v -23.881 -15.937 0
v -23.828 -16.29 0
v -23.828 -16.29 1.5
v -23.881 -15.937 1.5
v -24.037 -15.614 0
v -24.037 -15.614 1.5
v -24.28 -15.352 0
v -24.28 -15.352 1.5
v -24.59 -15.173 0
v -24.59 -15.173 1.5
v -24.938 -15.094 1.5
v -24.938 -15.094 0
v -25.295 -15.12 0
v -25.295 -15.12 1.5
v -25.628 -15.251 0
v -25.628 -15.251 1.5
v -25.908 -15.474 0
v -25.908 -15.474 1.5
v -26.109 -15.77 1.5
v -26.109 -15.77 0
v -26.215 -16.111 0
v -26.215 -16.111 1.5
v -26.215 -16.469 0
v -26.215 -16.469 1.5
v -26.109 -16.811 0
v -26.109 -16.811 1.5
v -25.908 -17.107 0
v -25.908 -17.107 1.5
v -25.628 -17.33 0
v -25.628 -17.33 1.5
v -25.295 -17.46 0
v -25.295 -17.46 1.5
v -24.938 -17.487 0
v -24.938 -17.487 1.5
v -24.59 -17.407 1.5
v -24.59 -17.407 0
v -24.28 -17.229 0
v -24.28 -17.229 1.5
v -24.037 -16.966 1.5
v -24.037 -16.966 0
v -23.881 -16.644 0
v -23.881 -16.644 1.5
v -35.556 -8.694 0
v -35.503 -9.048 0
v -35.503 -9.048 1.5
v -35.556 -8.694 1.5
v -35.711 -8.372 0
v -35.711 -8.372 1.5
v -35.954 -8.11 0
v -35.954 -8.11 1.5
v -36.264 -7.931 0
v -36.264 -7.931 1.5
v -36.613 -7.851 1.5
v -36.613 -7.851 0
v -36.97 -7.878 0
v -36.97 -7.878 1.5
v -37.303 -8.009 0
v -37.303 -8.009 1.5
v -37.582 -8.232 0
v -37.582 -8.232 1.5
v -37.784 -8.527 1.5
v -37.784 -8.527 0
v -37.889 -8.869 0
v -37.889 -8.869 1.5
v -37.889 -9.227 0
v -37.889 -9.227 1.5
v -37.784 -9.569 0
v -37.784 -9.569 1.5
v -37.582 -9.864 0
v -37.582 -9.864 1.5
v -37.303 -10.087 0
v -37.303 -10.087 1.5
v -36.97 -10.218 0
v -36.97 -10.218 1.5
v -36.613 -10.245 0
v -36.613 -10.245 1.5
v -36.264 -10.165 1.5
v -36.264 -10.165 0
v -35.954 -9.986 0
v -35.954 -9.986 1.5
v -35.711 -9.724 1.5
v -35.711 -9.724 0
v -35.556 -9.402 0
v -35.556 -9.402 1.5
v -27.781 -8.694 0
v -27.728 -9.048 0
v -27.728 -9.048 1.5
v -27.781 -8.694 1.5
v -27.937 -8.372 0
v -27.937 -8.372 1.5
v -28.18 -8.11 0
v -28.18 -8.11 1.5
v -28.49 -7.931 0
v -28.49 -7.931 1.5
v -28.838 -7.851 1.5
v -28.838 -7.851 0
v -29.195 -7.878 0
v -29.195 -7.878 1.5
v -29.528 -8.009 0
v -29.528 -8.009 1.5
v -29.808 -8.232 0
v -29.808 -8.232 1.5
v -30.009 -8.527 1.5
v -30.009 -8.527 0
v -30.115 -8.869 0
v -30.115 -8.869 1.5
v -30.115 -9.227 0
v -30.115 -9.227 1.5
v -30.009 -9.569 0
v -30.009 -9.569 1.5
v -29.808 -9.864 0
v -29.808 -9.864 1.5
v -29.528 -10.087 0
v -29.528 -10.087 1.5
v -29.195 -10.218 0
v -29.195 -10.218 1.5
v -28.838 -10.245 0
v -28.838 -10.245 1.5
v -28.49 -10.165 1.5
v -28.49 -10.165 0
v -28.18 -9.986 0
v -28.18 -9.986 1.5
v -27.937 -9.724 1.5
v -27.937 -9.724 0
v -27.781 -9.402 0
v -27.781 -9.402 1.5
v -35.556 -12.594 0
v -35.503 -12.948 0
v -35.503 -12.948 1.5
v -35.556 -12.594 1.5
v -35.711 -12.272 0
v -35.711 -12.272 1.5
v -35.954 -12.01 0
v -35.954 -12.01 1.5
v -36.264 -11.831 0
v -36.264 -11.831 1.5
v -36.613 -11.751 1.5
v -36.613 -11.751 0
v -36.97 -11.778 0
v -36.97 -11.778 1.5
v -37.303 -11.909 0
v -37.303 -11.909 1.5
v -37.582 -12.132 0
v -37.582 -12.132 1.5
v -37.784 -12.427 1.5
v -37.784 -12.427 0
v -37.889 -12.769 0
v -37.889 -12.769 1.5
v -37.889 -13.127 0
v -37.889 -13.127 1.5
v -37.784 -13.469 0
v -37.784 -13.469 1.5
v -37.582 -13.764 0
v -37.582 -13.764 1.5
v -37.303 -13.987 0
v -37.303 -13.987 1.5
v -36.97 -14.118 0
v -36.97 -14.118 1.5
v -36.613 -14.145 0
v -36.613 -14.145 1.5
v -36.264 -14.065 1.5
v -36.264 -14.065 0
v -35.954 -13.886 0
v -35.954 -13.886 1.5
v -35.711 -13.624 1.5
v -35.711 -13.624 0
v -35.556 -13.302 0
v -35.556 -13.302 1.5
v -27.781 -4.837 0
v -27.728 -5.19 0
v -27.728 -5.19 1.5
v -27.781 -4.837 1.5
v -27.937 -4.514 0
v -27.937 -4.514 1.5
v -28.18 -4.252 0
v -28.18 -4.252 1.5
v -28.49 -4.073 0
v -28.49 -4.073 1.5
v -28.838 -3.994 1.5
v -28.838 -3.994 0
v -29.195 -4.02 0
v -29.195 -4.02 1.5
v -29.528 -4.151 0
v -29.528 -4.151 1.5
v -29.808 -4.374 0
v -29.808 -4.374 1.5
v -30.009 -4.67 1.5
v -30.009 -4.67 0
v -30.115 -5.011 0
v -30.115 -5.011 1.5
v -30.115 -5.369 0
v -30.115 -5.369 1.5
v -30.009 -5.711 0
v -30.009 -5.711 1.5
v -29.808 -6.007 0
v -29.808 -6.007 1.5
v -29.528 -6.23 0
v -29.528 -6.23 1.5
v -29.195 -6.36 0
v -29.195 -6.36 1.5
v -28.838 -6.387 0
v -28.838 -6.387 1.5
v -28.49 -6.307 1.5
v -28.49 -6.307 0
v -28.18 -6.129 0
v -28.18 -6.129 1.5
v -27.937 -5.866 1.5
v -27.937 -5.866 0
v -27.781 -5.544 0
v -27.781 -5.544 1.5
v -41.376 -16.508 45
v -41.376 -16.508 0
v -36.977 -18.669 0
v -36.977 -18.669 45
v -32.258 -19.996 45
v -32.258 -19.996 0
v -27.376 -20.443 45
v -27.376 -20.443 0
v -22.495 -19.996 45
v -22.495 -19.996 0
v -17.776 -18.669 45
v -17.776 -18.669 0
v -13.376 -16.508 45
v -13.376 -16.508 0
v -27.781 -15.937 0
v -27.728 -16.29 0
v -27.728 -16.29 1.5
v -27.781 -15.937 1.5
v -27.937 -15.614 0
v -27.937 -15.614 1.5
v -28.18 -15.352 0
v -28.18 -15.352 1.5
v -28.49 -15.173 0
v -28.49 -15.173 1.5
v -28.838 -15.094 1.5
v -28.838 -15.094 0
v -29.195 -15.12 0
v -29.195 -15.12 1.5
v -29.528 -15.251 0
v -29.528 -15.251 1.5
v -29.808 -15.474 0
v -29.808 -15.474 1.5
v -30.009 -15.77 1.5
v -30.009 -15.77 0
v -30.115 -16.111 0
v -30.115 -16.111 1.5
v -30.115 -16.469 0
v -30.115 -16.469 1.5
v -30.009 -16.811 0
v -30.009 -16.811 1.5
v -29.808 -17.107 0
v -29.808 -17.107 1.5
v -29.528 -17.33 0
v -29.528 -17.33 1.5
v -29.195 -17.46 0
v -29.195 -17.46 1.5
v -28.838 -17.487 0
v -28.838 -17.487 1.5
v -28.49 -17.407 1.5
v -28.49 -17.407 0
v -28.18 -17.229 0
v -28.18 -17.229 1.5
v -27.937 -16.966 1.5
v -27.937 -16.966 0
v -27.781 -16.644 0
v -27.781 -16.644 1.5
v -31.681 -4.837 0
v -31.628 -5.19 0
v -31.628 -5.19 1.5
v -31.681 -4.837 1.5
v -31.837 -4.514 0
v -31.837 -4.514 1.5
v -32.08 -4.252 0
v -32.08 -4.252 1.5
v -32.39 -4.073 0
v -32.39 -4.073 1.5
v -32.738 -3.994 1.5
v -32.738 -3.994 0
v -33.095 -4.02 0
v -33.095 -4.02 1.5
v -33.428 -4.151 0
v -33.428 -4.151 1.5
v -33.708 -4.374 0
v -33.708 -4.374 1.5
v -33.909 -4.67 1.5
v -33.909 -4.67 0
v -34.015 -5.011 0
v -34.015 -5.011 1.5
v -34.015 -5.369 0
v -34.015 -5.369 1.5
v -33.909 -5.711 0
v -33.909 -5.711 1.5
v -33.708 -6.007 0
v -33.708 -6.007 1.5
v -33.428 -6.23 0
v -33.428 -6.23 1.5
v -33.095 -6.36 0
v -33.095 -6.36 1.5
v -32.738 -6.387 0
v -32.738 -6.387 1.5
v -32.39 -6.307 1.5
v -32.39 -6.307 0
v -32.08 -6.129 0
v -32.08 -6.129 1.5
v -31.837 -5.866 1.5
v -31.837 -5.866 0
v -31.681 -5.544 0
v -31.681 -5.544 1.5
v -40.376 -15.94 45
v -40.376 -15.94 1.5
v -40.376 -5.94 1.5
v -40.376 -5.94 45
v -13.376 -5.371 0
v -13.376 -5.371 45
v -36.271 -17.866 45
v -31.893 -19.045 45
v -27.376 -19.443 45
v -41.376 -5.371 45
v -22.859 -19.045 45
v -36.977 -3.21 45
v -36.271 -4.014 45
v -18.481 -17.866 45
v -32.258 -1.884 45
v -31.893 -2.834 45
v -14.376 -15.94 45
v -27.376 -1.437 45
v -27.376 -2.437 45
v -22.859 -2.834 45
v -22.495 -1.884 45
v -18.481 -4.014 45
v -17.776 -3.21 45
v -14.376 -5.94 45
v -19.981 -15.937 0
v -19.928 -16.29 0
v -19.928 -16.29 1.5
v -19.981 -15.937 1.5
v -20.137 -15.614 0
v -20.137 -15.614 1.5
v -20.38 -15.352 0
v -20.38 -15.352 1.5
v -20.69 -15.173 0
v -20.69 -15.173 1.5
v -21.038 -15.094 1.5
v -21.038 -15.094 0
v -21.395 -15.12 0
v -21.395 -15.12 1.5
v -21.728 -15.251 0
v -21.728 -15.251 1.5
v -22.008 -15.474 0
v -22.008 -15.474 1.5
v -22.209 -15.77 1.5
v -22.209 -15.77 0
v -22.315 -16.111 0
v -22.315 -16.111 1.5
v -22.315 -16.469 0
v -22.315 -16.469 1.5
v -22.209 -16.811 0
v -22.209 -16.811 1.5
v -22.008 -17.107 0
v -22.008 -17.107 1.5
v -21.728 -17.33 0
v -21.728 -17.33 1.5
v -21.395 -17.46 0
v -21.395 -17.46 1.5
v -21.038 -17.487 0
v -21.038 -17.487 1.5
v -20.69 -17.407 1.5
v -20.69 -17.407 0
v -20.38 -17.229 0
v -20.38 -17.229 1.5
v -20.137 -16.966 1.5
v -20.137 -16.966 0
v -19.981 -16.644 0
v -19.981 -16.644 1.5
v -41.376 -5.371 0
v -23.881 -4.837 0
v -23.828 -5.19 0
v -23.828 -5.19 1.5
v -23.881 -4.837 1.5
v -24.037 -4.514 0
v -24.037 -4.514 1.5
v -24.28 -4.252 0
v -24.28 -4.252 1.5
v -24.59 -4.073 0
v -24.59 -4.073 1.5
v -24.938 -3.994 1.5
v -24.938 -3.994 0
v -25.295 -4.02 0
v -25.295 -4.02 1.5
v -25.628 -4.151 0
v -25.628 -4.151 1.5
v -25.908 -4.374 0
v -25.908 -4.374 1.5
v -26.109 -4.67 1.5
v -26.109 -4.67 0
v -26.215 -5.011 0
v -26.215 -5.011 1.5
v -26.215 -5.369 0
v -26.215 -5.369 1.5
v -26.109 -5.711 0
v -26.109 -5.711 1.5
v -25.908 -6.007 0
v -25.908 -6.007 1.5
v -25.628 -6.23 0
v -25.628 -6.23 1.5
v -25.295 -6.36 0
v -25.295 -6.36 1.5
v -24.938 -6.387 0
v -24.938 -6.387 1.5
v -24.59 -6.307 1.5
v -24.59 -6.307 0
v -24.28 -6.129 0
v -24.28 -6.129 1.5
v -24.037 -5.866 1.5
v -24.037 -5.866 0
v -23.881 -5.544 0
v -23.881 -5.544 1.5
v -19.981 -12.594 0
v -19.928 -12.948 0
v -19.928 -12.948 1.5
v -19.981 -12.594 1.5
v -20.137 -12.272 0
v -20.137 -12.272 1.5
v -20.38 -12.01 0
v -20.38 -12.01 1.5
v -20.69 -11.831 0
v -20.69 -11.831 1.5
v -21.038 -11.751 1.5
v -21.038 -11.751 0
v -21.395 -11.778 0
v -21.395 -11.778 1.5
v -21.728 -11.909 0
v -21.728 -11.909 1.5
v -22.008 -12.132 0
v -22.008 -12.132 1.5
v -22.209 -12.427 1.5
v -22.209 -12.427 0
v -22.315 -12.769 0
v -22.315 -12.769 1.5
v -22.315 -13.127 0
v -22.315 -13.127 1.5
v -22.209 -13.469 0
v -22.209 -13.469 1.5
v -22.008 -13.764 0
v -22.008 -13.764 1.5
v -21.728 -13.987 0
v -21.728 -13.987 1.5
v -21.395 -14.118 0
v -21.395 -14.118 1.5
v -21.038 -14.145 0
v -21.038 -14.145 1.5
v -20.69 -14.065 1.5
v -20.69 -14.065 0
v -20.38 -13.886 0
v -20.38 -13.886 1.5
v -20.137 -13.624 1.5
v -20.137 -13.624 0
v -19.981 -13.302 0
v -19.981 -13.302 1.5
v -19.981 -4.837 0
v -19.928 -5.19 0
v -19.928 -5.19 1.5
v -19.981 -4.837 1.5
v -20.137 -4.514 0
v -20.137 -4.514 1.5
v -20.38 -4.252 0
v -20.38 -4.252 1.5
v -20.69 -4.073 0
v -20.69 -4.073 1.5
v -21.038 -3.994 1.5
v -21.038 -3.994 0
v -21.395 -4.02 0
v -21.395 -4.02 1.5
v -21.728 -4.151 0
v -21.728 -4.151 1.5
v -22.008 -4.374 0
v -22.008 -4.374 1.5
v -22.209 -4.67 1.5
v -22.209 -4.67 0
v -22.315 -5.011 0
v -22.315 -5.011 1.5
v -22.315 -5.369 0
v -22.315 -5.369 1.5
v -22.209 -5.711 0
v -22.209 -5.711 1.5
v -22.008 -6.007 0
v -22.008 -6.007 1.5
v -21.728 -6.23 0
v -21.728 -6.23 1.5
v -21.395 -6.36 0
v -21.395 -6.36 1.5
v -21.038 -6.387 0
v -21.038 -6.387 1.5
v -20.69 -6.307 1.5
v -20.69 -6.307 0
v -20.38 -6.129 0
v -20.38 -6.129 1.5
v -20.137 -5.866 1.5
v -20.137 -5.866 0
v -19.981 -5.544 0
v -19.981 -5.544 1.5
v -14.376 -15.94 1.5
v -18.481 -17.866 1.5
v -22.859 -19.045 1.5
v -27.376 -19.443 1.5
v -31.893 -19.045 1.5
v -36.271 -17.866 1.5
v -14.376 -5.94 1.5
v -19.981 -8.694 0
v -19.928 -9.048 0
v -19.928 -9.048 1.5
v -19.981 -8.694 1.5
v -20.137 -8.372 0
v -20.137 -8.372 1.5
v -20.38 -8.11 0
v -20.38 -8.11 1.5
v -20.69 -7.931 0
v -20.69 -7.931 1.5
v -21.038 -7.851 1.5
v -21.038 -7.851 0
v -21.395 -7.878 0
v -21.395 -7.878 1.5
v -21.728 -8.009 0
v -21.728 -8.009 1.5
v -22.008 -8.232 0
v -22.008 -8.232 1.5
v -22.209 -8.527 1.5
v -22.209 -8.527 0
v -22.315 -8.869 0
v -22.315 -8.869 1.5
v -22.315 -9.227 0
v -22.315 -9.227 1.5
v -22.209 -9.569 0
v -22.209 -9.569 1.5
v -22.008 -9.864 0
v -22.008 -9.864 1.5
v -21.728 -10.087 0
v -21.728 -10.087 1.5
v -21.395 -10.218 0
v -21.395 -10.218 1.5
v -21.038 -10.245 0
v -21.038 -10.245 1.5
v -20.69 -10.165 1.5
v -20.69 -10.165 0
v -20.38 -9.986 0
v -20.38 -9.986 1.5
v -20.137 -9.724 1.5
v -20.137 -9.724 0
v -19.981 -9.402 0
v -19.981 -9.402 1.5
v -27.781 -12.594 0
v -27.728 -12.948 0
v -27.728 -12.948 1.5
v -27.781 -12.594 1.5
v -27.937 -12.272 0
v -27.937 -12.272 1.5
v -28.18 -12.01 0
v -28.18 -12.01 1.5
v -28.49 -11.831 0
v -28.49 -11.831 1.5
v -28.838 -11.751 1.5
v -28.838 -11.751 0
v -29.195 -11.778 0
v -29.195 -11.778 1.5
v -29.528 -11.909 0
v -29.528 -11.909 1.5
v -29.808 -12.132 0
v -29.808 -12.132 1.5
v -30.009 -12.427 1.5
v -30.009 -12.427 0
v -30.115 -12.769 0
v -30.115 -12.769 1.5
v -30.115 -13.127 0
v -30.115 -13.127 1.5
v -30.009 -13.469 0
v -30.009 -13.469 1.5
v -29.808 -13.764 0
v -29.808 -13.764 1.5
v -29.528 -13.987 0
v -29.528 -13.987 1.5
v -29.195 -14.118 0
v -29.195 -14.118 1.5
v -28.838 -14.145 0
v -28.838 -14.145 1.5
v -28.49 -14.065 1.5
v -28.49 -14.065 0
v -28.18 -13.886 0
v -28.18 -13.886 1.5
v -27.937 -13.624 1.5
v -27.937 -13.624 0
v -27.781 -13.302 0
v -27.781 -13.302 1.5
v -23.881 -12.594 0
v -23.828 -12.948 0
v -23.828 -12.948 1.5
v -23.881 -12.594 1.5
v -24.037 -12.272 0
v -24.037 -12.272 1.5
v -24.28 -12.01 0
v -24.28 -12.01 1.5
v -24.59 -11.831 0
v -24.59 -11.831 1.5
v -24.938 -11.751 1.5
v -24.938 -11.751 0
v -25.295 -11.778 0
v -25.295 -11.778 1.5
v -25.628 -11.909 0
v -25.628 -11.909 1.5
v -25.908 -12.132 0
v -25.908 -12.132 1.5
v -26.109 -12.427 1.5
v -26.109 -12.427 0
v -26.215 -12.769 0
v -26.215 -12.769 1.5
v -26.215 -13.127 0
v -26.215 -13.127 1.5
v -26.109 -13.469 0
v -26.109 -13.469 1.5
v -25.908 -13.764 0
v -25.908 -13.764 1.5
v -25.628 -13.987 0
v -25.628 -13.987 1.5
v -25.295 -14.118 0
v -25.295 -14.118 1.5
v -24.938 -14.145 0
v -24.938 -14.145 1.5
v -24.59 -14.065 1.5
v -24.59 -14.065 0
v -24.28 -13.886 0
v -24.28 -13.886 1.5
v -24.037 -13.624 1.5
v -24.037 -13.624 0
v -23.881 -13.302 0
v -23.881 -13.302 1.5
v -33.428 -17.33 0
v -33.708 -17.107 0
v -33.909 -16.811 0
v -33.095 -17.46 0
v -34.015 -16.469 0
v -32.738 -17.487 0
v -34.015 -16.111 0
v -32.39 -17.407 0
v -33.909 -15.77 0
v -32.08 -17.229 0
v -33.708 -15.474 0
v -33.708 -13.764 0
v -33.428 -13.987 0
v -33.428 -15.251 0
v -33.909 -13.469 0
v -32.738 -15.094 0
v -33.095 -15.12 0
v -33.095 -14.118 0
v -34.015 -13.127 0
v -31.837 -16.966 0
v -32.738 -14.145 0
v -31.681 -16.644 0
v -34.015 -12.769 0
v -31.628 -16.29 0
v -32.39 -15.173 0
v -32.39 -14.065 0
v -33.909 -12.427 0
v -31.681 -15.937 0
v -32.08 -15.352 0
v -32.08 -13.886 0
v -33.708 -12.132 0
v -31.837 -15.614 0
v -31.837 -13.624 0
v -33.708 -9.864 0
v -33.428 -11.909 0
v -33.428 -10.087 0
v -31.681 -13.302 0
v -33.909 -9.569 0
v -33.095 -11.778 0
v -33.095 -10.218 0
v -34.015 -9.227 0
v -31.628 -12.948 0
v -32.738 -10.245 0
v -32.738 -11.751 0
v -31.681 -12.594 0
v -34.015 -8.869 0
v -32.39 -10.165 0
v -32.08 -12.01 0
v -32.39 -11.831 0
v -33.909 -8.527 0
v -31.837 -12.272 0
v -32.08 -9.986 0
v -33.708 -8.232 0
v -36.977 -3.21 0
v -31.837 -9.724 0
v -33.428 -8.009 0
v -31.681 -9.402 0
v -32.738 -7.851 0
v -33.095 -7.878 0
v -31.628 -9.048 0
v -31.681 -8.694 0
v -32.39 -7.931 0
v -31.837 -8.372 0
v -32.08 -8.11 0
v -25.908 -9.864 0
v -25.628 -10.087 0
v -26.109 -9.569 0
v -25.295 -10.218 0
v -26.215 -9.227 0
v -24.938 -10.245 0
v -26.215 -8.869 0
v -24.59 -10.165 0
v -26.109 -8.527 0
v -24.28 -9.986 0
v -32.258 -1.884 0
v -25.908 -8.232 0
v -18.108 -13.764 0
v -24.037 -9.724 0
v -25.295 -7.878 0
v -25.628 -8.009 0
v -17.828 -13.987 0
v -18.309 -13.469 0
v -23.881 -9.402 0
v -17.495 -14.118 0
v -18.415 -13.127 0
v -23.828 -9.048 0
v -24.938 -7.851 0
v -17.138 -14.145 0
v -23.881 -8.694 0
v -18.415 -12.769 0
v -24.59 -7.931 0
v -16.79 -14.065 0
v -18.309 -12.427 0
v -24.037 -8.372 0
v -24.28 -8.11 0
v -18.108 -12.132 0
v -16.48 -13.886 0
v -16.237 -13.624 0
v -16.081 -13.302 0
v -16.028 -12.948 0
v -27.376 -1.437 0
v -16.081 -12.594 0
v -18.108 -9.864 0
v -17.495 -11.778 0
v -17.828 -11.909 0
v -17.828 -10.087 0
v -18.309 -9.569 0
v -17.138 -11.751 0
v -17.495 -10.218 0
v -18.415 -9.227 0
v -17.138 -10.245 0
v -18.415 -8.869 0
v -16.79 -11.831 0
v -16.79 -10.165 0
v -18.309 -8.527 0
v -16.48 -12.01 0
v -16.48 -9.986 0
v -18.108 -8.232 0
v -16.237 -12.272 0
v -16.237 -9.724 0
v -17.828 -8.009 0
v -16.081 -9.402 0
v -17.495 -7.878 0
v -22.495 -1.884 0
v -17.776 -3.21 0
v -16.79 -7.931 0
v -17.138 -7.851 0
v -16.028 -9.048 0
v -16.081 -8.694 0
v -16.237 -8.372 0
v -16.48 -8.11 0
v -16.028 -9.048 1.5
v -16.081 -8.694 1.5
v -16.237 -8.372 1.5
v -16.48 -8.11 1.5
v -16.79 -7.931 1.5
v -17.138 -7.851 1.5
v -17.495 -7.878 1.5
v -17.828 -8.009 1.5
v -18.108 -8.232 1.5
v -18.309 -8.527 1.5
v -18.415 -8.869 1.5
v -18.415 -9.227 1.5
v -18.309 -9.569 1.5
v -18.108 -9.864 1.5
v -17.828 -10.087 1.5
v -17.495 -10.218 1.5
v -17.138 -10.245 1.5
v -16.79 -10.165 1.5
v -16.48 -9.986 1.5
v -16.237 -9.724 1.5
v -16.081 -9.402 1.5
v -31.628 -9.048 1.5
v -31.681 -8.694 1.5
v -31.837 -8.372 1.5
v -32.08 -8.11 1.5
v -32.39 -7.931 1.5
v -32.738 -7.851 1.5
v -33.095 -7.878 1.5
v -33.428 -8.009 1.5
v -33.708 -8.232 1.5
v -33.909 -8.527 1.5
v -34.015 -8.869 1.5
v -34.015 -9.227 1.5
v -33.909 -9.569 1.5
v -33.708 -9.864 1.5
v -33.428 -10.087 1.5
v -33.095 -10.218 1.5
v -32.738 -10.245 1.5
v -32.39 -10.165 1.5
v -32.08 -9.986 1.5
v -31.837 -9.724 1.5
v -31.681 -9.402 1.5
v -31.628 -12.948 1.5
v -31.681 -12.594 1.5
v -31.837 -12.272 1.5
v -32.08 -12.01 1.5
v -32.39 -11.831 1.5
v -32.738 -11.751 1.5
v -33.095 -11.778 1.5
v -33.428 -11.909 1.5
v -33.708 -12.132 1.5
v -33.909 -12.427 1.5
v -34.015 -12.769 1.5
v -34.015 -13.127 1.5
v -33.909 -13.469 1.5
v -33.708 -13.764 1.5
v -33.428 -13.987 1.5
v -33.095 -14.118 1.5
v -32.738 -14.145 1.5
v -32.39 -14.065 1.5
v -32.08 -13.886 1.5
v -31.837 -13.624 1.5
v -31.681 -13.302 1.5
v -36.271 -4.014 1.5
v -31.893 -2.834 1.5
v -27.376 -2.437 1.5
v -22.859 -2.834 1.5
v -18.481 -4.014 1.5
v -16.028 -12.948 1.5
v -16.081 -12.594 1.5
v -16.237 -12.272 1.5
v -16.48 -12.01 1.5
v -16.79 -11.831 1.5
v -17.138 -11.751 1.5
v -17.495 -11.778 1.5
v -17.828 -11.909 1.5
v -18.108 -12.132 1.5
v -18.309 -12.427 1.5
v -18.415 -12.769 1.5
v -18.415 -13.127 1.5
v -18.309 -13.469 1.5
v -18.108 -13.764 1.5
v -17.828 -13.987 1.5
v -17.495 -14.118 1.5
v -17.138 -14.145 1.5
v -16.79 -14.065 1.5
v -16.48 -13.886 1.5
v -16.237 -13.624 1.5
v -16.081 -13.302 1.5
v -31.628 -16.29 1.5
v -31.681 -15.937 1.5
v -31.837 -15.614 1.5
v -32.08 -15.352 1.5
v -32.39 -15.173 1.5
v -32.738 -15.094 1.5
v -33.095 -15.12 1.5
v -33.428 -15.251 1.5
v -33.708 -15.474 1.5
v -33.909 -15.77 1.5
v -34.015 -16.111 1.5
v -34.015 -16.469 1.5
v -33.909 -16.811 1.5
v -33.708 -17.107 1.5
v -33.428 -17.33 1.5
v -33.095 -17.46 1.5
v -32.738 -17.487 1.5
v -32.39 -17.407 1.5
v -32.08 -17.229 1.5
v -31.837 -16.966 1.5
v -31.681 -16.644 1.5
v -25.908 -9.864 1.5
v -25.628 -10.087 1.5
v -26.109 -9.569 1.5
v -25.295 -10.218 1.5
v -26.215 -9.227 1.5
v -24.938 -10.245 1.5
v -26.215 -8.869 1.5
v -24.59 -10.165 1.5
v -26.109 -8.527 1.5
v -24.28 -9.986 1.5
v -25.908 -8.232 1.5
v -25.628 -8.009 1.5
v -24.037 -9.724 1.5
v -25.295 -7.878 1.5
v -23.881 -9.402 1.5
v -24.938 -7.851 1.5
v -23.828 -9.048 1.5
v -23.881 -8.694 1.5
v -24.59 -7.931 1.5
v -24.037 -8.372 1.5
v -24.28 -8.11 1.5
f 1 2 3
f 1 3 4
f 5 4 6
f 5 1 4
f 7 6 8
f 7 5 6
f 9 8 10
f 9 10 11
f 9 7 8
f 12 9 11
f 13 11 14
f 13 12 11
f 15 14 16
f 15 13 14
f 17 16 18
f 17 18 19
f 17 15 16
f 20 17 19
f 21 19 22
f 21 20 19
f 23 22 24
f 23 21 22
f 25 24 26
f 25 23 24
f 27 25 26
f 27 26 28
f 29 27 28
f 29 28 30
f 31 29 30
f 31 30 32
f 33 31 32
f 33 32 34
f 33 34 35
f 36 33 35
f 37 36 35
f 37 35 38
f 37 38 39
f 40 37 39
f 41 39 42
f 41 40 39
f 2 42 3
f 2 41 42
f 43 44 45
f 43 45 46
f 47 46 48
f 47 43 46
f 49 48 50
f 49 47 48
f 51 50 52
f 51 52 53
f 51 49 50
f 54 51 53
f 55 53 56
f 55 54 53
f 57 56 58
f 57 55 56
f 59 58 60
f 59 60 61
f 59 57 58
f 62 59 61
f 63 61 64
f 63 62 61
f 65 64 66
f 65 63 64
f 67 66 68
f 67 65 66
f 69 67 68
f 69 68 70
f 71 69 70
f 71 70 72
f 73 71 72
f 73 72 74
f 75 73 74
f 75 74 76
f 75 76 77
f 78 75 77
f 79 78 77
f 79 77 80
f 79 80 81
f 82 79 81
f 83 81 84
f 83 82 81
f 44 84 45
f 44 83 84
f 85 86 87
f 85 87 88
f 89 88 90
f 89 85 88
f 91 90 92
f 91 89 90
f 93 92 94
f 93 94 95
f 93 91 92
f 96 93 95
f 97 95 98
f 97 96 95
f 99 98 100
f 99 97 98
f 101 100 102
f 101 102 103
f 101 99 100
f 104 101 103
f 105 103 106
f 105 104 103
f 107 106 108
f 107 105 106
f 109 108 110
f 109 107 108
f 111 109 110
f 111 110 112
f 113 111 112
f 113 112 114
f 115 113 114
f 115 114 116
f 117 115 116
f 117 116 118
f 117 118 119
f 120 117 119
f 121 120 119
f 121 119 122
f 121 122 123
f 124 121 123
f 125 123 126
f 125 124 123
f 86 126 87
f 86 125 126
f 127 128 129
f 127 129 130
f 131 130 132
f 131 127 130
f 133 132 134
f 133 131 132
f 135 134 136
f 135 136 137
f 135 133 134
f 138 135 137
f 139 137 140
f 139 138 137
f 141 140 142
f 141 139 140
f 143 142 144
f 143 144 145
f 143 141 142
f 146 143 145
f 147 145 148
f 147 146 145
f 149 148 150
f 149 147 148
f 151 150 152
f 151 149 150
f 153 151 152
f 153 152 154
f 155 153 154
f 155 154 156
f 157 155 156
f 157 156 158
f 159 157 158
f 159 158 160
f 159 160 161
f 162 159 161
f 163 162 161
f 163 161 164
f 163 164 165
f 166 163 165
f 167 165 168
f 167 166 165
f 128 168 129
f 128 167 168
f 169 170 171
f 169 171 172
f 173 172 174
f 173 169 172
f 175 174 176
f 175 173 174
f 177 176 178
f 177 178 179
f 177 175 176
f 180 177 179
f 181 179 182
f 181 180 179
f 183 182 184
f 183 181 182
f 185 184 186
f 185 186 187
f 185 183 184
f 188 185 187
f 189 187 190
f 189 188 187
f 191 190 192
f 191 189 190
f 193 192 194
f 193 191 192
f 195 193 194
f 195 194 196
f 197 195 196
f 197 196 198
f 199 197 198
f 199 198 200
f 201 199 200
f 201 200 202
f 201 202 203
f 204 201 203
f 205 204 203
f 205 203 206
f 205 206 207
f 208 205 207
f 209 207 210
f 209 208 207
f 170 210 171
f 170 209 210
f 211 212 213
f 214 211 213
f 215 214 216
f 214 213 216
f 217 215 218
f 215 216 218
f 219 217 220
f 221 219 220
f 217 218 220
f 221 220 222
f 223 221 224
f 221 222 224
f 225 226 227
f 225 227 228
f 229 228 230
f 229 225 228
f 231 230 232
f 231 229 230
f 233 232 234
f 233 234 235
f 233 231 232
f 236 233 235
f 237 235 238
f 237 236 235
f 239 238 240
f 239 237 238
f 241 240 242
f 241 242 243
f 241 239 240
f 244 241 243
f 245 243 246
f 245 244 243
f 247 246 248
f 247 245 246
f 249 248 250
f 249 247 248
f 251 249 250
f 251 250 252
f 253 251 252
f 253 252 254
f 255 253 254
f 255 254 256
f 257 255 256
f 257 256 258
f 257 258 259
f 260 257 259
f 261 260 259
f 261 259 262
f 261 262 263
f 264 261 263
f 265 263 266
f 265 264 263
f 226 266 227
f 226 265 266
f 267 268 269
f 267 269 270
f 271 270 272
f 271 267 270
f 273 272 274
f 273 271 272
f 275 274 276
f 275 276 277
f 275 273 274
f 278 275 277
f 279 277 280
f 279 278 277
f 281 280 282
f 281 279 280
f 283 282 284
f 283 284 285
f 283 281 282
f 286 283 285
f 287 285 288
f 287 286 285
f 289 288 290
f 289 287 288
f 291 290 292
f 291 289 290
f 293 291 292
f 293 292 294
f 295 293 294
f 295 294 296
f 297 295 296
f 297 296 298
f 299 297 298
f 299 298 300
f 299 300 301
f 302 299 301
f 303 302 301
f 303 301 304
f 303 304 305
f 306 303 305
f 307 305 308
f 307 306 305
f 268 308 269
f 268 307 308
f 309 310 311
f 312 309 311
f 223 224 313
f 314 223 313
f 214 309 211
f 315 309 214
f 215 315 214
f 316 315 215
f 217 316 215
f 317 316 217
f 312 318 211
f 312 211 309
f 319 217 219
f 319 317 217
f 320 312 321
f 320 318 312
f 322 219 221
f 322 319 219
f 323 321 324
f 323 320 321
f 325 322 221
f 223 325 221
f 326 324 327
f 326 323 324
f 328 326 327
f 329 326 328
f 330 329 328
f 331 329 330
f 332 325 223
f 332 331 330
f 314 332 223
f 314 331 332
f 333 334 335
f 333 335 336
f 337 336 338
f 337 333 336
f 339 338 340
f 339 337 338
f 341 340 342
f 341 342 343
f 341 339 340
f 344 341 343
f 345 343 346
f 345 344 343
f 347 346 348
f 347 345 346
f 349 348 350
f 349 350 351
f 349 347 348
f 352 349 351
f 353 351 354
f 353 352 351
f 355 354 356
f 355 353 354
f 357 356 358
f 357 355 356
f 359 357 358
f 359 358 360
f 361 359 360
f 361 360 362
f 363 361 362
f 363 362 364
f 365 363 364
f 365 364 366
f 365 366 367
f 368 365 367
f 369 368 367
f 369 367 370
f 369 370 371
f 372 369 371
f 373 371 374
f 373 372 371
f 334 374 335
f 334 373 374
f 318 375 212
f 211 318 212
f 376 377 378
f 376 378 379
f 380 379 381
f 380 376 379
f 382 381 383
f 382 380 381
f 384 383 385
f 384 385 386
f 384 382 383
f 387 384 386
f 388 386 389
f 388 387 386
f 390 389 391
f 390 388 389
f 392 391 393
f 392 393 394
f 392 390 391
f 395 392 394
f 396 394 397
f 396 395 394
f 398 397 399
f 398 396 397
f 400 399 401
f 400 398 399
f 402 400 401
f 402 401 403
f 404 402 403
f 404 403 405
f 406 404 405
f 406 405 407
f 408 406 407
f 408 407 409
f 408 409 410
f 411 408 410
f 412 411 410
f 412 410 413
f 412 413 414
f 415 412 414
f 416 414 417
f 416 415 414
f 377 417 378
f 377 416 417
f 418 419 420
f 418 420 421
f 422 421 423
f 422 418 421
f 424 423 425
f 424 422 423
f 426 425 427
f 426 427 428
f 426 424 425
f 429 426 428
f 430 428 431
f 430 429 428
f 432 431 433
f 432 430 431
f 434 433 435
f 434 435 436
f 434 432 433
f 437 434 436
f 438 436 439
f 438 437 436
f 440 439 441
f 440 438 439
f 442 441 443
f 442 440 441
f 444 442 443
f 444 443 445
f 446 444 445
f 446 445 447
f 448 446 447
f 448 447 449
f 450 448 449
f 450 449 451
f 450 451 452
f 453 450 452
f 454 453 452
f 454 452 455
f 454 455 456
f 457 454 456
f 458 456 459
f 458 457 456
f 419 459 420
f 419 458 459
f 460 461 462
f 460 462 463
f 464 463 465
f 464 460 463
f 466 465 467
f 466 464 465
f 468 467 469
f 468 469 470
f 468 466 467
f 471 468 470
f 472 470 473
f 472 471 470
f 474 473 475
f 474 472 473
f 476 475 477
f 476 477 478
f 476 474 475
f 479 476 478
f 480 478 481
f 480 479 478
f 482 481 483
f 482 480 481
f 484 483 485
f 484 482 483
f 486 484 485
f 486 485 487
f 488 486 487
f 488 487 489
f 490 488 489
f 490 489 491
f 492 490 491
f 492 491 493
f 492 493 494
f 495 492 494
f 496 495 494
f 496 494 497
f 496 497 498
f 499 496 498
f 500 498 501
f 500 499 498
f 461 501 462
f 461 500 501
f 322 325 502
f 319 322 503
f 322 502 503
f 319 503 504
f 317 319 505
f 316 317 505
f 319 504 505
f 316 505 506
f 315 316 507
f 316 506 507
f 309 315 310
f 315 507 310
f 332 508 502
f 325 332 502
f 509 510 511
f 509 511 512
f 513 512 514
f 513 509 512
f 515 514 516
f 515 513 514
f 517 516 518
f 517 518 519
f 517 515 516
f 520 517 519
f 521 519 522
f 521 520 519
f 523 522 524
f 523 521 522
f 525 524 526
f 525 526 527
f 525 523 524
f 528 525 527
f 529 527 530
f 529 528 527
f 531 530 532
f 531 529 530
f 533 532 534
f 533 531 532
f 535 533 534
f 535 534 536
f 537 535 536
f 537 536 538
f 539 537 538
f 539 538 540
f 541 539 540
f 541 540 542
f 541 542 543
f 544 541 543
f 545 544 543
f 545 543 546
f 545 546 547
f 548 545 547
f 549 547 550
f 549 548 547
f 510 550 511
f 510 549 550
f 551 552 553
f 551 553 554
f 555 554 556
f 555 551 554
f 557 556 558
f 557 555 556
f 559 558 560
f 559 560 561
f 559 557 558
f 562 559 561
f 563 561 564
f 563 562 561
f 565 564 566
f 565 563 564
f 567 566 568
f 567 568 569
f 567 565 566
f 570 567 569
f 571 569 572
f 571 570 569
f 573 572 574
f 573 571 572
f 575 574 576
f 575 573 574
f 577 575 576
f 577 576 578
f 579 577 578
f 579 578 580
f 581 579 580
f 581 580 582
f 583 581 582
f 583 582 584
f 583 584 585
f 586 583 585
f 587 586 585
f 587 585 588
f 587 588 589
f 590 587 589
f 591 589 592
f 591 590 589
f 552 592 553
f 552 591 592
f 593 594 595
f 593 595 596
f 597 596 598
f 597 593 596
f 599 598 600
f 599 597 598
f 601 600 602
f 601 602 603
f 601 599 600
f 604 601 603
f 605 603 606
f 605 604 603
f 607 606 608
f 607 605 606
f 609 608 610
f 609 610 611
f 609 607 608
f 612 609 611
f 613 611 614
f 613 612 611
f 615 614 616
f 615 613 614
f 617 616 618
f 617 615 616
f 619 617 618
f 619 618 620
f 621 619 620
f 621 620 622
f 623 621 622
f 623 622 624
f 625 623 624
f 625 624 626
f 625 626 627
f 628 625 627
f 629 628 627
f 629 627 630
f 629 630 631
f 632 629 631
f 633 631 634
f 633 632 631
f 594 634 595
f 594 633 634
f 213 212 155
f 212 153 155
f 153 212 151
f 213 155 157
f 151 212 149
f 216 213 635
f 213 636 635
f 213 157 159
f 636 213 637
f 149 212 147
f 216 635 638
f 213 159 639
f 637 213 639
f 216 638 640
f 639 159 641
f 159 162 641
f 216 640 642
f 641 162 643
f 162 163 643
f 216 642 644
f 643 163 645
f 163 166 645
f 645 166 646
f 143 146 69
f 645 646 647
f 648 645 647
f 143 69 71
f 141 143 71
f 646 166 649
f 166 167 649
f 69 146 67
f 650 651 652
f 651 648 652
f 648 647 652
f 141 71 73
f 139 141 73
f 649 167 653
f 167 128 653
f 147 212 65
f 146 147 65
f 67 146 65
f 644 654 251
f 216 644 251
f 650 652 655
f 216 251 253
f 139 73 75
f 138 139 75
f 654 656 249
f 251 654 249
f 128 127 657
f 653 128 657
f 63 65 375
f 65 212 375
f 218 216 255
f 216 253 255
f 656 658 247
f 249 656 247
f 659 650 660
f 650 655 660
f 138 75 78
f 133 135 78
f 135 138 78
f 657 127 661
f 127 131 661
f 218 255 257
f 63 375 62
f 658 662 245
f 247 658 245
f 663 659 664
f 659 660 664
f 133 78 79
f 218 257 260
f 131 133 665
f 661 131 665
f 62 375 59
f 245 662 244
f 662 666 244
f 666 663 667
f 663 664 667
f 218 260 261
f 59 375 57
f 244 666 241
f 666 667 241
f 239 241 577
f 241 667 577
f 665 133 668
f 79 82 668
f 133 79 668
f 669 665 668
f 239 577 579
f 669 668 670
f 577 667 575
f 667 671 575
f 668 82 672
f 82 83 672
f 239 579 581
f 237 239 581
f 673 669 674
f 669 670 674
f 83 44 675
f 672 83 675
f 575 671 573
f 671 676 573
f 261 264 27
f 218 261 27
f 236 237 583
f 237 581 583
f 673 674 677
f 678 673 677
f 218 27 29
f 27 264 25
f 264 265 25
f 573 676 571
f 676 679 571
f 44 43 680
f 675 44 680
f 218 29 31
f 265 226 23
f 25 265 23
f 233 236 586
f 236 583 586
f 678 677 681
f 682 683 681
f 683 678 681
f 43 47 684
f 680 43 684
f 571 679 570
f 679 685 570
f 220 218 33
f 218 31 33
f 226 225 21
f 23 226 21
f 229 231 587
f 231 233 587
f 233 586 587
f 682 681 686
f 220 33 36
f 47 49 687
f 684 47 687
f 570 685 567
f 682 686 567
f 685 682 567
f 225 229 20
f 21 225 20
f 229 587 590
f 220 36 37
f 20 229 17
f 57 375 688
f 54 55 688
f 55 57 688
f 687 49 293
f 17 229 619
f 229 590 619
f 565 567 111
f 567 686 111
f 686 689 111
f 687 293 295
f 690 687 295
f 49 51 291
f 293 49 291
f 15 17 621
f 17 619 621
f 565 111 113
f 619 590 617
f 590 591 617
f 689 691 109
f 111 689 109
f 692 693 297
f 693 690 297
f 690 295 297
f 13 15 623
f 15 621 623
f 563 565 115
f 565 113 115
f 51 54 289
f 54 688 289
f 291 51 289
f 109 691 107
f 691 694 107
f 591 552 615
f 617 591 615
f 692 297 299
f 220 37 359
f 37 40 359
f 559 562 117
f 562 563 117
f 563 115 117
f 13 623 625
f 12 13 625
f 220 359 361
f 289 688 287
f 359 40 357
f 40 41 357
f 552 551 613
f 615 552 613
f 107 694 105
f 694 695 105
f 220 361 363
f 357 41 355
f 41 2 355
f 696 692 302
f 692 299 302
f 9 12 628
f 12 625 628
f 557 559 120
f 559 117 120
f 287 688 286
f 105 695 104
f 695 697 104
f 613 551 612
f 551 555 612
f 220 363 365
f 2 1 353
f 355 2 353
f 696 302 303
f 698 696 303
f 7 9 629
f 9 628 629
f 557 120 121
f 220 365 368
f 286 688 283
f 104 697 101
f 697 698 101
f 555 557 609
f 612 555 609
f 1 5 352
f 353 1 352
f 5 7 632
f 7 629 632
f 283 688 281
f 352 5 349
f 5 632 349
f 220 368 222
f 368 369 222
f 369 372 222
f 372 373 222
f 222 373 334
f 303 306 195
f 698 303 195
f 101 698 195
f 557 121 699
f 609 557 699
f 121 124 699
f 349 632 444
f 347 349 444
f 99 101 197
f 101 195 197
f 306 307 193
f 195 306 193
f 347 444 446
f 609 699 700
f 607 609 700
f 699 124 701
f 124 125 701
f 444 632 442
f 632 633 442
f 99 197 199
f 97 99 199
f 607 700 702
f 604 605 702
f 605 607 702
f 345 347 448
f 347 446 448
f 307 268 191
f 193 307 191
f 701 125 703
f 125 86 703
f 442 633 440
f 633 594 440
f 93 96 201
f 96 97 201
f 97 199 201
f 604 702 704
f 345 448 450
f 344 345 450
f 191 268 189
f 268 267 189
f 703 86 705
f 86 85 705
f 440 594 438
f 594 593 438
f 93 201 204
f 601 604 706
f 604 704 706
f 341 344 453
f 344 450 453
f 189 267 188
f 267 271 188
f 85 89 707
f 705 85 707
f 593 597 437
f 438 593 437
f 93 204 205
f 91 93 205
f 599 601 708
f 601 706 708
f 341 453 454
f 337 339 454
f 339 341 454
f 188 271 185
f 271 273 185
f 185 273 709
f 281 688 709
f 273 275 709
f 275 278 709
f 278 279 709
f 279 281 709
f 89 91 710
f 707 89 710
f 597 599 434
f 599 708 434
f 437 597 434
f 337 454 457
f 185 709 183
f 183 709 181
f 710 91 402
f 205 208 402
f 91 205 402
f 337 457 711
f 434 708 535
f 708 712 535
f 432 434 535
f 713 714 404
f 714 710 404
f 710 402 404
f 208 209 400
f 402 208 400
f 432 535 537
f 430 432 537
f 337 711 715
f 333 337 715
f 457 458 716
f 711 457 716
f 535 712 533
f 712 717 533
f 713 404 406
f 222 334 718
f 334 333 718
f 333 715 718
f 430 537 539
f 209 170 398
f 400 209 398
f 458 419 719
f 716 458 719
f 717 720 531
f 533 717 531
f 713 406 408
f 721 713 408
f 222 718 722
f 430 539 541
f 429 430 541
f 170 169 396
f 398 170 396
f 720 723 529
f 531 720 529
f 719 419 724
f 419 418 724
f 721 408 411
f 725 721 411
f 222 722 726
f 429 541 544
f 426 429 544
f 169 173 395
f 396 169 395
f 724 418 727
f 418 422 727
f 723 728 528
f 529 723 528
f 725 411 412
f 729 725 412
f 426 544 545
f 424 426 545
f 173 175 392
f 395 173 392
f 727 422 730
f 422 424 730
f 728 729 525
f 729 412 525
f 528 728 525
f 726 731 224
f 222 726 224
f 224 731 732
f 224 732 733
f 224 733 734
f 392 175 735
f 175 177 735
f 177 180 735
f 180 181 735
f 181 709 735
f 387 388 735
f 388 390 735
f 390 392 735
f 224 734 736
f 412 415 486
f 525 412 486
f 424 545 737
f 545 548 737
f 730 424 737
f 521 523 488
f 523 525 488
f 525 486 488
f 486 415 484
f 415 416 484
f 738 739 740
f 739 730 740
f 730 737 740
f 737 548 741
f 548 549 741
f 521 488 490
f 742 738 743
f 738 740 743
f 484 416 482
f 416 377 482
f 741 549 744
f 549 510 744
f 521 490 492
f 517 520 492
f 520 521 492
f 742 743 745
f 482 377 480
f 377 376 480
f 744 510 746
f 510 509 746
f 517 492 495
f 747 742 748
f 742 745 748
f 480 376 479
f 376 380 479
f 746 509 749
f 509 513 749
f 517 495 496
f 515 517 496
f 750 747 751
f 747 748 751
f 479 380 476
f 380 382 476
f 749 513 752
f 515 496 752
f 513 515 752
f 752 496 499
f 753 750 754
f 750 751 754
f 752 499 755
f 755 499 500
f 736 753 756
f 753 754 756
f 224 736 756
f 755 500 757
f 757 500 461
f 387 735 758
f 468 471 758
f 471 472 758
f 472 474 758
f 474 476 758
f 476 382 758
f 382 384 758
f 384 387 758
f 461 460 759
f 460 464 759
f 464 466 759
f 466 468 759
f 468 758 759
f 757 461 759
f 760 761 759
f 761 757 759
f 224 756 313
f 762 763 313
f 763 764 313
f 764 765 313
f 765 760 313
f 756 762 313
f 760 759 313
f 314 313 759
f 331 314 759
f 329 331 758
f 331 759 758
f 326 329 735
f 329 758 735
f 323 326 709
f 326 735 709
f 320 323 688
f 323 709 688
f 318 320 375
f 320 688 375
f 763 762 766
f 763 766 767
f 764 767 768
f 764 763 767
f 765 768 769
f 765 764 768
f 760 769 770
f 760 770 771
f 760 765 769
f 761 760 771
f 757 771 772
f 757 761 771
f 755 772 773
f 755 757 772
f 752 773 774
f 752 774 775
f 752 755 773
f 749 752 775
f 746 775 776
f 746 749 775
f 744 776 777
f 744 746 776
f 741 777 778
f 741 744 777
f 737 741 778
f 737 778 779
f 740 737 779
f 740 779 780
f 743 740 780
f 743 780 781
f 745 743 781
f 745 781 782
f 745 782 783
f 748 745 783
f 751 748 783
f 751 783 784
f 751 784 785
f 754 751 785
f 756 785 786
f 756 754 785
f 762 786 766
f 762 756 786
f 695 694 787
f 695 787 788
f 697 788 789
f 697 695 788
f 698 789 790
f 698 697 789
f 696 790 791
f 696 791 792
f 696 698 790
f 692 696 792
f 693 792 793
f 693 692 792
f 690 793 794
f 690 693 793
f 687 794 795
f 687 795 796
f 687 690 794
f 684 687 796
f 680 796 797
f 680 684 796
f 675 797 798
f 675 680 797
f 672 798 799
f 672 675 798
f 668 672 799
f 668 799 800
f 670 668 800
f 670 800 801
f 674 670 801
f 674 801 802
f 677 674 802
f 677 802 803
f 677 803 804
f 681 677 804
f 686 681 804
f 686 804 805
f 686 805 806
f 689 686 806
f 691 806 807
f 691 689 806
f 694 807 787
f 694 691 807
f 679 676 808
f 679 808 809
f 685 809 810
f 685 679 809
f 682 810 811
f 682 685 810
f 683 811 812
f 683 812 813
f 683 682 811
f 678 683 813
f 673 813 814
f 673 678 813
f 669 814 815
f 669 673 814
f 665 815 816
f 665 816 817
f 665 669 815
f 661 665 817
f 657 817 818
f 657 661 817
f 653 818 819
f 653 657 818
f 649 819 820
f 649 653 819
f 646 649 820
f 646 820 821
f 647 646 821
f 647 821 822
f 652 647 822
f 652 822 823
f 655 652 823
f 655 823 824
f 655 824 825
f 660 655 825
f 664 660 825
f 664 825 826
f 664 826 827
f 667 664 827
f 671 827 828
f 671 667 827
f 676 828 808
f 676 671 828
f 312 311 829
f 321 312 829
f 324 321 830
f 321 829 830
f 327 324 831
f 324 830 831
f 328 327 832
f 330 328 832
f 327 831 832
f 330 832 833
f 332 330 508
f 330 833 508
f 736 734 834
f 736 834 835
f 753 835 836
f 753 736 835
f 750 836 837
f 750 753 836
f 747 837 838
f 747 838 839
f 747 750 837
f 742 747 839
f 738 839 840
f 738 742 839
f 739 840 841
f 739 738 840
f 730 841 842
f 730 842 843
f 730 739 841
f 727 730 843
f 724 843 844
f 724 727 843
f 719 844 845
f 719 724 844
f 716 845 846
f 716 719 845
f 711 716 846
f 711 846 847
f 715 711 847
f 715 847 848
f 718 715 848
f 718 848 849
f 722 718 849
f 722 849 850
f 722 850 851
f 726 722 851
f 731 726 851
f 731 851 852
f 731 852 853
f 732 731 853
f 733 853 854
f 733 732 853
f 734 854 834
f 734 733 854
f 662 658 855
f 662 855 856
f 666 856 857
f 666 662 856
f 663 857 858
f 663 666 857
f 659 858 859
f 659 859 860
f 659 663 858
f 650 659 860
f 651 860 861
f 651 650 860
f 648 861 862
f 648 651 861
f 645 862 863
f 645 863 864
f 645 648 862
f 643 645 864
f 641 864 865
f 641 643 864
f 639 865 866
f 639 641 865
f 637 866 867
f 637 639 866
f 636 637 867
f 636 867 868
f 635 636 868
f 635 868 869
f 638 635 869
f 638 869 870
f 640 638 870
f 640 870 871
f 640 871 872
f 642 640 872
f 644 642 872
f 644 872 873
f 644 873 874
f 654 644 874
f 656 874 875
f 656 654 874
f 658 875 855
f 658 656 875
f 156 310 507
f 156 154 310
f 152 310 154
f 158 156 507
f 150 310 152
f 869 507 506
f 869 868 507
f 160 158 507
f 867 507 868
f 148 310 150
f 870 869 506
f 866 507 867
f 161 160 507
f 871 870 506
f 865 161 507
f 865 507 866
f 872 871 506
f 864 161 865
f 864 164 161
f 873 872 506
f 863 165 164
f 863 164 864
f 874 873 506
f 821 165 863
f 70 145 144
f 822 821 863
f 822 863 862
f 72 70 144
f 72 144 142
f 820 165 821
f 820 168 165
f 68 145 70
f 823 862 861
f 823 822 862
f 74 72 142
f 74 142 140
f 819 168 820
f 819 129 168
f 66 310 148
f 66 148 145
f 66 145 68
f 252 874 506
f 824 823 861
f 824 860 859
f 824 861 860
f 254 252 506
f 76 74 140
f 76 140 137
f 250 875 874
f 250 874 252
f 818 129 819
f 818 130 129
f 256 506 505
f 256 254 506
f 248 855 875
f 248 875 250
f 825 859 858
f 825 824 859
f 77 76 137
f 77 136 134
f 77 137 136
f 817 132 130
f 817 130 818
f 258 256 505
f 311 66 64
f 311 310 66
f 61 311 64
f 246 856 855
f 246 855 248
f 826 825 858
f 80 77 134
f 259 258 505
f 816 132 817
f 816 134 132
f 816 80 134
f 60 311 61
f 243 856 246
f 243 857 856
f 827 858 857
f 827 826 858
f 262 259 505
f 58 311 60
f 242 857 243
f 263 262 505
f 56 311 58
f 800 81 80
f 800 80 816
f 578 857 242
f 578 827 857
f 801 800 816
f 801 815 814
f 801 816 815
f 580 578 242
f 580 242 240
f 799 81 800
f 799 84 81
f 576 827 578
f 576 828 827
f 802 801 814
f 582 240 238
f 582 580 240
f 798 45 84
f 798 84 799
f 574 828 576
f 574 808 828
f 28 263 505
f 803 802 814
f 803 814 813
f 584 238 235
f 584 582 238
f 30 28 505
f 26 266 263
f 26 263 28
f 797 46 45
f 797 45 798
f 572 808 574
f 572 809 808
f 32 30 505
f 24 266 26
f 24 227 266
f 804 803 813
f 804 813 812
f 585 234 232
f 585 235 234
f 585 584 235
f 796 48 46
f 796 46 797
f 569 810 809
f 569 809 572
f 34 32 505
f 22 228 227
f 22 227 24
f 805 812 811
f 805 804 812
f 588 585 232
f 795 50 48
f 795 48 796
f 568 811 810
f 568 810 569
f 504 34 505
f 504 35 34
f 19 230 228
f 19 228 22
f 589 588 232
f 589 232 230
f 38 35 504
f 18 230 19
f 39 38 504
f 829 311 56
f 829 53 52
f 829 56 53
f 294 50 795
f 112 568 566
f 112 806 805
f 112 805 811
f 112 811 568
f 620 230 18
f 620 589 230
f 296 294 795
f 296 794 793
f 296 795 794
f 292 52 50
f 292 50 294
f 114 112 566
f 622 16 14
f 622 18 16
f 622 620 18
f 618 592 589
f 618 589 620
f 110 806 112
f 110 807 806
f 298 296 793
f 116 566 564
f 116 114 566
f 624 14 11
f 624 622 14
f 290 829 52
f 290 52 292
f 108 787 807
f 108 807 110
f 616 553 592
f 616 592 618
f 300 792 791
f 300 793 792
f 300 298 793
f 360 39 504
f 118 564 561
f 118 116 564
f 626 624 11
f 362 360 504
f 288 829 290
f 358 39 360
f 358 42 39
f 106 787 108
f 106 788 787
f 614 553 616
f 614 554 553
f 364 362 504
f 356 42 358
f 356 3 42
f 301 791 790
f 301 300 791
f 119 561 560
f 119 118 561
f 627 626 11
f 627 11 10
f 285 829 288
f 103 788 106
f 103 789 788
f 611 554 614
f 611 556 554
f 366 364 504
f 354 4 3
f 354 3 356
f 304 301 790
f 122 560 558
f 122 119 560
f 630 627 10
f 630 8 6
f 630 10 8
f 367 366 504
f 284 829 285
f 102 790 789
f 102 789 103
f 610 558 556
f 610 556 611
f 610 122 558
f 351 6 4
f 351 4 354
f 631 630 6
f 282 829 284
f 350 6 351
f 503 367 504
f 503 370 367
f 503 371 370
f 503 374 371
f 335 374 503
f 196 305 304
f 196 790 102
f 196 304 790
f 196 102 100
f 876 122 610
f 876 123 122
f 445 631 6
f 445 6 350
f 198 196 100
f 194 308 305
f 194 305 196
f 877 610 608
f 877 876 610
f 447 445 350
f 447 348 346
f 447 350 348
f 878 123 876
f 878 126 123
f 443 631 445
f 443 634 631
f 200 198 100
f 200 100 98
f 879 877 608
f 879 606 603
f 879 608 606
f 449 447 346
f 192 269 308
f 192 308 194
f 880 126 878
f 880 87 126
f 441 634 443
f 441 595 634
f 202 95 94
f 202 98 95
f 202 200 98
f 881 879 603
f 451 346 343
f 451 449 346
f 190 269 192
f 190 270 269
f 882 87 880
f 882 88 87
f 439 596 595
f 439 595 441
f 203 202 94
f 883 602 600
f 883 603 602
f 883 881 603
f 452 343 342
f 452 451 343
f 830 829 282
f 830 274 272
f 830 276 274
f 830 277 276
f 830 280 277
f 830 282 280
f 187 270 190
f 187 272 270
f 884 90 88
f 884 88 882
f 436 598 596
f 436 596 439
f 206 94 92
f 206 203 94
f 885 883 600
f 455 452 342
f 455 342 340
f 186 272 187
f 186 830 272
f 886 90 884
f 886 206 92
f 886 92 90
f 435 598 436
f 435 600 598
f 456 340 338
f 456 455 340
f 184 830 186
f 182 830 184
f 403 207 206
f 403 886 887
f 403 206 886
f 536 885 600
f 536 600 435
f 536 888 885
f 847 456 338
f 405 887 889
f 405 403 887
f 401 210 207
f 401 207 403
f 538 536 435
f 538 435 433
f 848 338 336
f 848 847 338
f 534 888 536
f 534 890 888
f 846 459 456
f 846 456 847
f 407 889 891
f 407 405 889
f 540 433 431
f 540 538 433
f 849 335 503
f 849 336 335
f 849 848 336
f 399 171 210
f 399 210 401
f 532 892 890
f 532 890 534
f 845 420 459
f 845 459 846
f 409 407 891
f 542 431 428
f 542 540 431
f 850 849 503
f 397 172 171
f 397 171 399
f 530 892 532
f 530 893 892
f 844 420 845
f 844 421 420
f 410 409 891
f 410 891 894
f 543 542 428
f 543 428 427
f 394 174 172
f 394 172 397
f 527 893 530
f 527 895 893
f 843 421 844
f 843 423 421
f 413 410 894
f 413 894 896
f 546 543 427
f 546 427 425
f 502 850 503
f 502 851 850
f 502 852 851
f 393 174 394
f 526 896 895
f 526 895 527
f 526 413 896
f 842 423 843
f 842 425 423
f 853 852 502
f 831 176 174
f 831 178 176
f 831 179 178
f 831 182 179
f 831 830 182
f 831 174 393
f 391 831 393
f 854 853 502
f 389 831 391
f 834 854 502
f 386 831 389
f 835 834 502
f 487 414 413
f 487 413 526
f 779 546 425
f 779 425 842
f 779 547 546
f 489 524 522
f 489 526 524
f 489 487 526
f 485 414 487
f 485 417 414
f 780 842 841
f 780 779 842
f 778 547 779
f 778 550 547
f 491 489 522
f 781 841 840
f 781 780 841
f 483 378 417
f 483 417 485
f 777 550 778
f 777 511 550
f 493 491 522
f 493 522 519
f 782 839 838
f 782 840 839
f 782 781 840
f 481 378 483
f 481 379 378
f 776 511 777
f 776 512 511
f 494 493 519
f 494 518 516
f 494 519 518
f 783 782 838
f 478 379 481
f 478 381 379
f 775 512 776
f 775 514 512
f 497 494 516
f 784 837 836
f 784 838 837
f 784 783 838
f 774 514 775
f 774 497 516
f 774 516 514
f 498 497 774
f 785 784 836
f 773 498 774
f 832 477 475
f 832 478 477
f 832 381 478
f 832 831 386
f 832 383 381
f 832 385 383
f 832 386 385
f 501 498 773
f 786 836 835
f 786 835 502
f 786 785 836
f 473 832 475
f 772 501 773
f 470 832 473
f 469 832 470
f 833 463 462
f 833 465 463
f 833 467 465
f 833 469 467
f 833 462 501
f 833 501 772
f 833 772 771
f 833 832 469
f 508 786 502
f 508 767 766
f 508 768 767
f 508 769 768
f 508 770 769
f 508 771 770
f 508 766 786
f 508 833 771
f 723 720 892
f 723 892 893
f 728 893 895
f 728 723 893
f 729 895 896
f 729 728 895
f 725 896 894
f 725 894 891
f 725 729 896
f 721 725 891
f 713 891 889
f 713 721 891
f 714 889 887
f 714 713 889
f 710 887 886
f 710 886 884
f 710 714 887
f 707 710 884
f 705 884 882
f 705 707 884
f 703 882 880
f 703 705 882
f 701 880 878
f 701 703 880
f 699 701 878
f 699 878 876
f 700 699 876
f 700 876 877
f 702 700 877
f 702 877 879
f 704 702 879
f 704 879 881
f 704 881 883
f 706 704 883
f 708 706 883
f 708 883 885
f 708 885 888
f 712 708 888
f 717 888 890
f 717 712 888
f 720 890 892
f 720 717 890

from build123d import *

# Parameters (mm, degrees)
F1_DEPTH = 45
F0_R     = 1.2
F2_DEPTH = 1.5


with BuildPart() as f1:
    # F0 (on Top) → F1 (new body)
    with BuildSketch(Plane.XY):
        with BuildLine():
            Line((-13.376313, -16.508007), (-13.376313, -5.371486))
            ThreePointArc((-13.376313, -5.371486), (-27.376313, -1.436818), (-41.376313, -5.371486))
            Line((-41.376313, -5.371486), (-41.376313, -16.508007))
            ThreePointArc((-41.376313, -16.508007), (-27.376313, -20.442675), (-13.376313, -16.508007))
        make_face()
        with BuildLine():
            Line((-40.376313, -15.939747), (-40.376313, -5.939747))
            ThreePointArc((-40.376313, -5.939747), (-27.376313, -2.436818), (-14.376313, -5.939747))
            Line((-14.376313, -5.939747), (-14.376313, -15.939747))
            ThreePointArc((-14.376313, -15.939747), (-27.376313, -19.442675), (-40.376313, -15.939747))
        make_face(mode=Mode.SUBTRACT)
    extrude(amount=F1_DEPTH)

    # F0 (on Top) → F2 (join)
    with BuildSketch(Plane.XY):
        with BuildLine():
            ThreePointArc((-14.376313, -5.939747), (-27.376313, -2.436818), (-40.376313, -5.939747))
            Line((-40.376313, -5.939747), (-40.376313, -15.939747))
            ThreePointArc((-40.376313, -15.939747), (-27.376313, -19.442675), (-14.376313, -15.939747))
            Line((-14.376313, -15.939747), (-14.376313, -5.939747))
        make_face()
        with Locations((-32.828095, -16.290346)):
            Circle(F0_R, mode=Mode.SUBTRACT)
        with Locations((-28.928095, -16.290346)):
            Circle(F0_R, mode=Mode.SUBTRACT)
        with Locations((-36.702558, -12.947978)):
            Circle(F0_R, mode=Mode.SUBTRACT)
        with Locations((-32.828095, -12.947978)):
            Circle(F0_R, mode=Mode.SUBTRACT)
        with Locations((-28.928095, -12.947978)):
            Circle(F0_R, mode=Mode.SUBTRACT)
        with Locations((-25.028095, -16.290346)):
            Circle(F0_R, mode=Mode.SUBTRACT)
        with Locations((-21.128095, -16.290346)):
            Circle(F0_R, mode=Mode.SUBTRACT)
        with Locations((-25.028095, -12.947978)):
            Circle(F0_R, mode=Mode.SUBTRACT)
        with Locations((-21.128095, -12.947978)):
            Circle(F0_R, mode=Mode.SUBTRACT)
        with Locations((-17.228095, -12.947978)):
            Circle(F0_R, mode=Mode.SUBTRACT)
        with Locations((-36.702558, -9.047978)):
            Circle(F0_R, mode=Mode.SUBTRACT)
        with Locations((-32.828095, -9.047978)):
            Circle(F0_R, mode=Mode.SUBTRACT)
        with Locations((-28.928095, -9.047978)):
            Circle(F0_R, mode=Mode.SUBTRACT)
        with Locations((-32.828095, -5.190346)):
            Circle(F0_R, mode=Mode.SUBTRACT)
        with Locations((-28.928095, -5.190346)):
            Circle(F0_R, mode=Mode.SUBTRACT)
        with Locations((-25.028095, -9.047978)):
            Circle(F0_R, mode=Mode.SUBTRACT)
        with Locations((-21.128095, -9.047978)):
            Circle(F0_R, mode=Mode.SUBTRACT)
        with Locations((-17.228095, -9.047978)):
            Circle(F0_R, mode=Mode.SUBTRACT)
        with Locations((-25.028095, -5.190346)):
            Circle(F0_R, mode=Mode.SUBTRACT)
        with Locations((-21.128095, -5.190346)):
            Circle(F0_R, mode=Mode.SUBTRACT)
    extrude(amount=F2_DEPTH)


solid = f1.part
